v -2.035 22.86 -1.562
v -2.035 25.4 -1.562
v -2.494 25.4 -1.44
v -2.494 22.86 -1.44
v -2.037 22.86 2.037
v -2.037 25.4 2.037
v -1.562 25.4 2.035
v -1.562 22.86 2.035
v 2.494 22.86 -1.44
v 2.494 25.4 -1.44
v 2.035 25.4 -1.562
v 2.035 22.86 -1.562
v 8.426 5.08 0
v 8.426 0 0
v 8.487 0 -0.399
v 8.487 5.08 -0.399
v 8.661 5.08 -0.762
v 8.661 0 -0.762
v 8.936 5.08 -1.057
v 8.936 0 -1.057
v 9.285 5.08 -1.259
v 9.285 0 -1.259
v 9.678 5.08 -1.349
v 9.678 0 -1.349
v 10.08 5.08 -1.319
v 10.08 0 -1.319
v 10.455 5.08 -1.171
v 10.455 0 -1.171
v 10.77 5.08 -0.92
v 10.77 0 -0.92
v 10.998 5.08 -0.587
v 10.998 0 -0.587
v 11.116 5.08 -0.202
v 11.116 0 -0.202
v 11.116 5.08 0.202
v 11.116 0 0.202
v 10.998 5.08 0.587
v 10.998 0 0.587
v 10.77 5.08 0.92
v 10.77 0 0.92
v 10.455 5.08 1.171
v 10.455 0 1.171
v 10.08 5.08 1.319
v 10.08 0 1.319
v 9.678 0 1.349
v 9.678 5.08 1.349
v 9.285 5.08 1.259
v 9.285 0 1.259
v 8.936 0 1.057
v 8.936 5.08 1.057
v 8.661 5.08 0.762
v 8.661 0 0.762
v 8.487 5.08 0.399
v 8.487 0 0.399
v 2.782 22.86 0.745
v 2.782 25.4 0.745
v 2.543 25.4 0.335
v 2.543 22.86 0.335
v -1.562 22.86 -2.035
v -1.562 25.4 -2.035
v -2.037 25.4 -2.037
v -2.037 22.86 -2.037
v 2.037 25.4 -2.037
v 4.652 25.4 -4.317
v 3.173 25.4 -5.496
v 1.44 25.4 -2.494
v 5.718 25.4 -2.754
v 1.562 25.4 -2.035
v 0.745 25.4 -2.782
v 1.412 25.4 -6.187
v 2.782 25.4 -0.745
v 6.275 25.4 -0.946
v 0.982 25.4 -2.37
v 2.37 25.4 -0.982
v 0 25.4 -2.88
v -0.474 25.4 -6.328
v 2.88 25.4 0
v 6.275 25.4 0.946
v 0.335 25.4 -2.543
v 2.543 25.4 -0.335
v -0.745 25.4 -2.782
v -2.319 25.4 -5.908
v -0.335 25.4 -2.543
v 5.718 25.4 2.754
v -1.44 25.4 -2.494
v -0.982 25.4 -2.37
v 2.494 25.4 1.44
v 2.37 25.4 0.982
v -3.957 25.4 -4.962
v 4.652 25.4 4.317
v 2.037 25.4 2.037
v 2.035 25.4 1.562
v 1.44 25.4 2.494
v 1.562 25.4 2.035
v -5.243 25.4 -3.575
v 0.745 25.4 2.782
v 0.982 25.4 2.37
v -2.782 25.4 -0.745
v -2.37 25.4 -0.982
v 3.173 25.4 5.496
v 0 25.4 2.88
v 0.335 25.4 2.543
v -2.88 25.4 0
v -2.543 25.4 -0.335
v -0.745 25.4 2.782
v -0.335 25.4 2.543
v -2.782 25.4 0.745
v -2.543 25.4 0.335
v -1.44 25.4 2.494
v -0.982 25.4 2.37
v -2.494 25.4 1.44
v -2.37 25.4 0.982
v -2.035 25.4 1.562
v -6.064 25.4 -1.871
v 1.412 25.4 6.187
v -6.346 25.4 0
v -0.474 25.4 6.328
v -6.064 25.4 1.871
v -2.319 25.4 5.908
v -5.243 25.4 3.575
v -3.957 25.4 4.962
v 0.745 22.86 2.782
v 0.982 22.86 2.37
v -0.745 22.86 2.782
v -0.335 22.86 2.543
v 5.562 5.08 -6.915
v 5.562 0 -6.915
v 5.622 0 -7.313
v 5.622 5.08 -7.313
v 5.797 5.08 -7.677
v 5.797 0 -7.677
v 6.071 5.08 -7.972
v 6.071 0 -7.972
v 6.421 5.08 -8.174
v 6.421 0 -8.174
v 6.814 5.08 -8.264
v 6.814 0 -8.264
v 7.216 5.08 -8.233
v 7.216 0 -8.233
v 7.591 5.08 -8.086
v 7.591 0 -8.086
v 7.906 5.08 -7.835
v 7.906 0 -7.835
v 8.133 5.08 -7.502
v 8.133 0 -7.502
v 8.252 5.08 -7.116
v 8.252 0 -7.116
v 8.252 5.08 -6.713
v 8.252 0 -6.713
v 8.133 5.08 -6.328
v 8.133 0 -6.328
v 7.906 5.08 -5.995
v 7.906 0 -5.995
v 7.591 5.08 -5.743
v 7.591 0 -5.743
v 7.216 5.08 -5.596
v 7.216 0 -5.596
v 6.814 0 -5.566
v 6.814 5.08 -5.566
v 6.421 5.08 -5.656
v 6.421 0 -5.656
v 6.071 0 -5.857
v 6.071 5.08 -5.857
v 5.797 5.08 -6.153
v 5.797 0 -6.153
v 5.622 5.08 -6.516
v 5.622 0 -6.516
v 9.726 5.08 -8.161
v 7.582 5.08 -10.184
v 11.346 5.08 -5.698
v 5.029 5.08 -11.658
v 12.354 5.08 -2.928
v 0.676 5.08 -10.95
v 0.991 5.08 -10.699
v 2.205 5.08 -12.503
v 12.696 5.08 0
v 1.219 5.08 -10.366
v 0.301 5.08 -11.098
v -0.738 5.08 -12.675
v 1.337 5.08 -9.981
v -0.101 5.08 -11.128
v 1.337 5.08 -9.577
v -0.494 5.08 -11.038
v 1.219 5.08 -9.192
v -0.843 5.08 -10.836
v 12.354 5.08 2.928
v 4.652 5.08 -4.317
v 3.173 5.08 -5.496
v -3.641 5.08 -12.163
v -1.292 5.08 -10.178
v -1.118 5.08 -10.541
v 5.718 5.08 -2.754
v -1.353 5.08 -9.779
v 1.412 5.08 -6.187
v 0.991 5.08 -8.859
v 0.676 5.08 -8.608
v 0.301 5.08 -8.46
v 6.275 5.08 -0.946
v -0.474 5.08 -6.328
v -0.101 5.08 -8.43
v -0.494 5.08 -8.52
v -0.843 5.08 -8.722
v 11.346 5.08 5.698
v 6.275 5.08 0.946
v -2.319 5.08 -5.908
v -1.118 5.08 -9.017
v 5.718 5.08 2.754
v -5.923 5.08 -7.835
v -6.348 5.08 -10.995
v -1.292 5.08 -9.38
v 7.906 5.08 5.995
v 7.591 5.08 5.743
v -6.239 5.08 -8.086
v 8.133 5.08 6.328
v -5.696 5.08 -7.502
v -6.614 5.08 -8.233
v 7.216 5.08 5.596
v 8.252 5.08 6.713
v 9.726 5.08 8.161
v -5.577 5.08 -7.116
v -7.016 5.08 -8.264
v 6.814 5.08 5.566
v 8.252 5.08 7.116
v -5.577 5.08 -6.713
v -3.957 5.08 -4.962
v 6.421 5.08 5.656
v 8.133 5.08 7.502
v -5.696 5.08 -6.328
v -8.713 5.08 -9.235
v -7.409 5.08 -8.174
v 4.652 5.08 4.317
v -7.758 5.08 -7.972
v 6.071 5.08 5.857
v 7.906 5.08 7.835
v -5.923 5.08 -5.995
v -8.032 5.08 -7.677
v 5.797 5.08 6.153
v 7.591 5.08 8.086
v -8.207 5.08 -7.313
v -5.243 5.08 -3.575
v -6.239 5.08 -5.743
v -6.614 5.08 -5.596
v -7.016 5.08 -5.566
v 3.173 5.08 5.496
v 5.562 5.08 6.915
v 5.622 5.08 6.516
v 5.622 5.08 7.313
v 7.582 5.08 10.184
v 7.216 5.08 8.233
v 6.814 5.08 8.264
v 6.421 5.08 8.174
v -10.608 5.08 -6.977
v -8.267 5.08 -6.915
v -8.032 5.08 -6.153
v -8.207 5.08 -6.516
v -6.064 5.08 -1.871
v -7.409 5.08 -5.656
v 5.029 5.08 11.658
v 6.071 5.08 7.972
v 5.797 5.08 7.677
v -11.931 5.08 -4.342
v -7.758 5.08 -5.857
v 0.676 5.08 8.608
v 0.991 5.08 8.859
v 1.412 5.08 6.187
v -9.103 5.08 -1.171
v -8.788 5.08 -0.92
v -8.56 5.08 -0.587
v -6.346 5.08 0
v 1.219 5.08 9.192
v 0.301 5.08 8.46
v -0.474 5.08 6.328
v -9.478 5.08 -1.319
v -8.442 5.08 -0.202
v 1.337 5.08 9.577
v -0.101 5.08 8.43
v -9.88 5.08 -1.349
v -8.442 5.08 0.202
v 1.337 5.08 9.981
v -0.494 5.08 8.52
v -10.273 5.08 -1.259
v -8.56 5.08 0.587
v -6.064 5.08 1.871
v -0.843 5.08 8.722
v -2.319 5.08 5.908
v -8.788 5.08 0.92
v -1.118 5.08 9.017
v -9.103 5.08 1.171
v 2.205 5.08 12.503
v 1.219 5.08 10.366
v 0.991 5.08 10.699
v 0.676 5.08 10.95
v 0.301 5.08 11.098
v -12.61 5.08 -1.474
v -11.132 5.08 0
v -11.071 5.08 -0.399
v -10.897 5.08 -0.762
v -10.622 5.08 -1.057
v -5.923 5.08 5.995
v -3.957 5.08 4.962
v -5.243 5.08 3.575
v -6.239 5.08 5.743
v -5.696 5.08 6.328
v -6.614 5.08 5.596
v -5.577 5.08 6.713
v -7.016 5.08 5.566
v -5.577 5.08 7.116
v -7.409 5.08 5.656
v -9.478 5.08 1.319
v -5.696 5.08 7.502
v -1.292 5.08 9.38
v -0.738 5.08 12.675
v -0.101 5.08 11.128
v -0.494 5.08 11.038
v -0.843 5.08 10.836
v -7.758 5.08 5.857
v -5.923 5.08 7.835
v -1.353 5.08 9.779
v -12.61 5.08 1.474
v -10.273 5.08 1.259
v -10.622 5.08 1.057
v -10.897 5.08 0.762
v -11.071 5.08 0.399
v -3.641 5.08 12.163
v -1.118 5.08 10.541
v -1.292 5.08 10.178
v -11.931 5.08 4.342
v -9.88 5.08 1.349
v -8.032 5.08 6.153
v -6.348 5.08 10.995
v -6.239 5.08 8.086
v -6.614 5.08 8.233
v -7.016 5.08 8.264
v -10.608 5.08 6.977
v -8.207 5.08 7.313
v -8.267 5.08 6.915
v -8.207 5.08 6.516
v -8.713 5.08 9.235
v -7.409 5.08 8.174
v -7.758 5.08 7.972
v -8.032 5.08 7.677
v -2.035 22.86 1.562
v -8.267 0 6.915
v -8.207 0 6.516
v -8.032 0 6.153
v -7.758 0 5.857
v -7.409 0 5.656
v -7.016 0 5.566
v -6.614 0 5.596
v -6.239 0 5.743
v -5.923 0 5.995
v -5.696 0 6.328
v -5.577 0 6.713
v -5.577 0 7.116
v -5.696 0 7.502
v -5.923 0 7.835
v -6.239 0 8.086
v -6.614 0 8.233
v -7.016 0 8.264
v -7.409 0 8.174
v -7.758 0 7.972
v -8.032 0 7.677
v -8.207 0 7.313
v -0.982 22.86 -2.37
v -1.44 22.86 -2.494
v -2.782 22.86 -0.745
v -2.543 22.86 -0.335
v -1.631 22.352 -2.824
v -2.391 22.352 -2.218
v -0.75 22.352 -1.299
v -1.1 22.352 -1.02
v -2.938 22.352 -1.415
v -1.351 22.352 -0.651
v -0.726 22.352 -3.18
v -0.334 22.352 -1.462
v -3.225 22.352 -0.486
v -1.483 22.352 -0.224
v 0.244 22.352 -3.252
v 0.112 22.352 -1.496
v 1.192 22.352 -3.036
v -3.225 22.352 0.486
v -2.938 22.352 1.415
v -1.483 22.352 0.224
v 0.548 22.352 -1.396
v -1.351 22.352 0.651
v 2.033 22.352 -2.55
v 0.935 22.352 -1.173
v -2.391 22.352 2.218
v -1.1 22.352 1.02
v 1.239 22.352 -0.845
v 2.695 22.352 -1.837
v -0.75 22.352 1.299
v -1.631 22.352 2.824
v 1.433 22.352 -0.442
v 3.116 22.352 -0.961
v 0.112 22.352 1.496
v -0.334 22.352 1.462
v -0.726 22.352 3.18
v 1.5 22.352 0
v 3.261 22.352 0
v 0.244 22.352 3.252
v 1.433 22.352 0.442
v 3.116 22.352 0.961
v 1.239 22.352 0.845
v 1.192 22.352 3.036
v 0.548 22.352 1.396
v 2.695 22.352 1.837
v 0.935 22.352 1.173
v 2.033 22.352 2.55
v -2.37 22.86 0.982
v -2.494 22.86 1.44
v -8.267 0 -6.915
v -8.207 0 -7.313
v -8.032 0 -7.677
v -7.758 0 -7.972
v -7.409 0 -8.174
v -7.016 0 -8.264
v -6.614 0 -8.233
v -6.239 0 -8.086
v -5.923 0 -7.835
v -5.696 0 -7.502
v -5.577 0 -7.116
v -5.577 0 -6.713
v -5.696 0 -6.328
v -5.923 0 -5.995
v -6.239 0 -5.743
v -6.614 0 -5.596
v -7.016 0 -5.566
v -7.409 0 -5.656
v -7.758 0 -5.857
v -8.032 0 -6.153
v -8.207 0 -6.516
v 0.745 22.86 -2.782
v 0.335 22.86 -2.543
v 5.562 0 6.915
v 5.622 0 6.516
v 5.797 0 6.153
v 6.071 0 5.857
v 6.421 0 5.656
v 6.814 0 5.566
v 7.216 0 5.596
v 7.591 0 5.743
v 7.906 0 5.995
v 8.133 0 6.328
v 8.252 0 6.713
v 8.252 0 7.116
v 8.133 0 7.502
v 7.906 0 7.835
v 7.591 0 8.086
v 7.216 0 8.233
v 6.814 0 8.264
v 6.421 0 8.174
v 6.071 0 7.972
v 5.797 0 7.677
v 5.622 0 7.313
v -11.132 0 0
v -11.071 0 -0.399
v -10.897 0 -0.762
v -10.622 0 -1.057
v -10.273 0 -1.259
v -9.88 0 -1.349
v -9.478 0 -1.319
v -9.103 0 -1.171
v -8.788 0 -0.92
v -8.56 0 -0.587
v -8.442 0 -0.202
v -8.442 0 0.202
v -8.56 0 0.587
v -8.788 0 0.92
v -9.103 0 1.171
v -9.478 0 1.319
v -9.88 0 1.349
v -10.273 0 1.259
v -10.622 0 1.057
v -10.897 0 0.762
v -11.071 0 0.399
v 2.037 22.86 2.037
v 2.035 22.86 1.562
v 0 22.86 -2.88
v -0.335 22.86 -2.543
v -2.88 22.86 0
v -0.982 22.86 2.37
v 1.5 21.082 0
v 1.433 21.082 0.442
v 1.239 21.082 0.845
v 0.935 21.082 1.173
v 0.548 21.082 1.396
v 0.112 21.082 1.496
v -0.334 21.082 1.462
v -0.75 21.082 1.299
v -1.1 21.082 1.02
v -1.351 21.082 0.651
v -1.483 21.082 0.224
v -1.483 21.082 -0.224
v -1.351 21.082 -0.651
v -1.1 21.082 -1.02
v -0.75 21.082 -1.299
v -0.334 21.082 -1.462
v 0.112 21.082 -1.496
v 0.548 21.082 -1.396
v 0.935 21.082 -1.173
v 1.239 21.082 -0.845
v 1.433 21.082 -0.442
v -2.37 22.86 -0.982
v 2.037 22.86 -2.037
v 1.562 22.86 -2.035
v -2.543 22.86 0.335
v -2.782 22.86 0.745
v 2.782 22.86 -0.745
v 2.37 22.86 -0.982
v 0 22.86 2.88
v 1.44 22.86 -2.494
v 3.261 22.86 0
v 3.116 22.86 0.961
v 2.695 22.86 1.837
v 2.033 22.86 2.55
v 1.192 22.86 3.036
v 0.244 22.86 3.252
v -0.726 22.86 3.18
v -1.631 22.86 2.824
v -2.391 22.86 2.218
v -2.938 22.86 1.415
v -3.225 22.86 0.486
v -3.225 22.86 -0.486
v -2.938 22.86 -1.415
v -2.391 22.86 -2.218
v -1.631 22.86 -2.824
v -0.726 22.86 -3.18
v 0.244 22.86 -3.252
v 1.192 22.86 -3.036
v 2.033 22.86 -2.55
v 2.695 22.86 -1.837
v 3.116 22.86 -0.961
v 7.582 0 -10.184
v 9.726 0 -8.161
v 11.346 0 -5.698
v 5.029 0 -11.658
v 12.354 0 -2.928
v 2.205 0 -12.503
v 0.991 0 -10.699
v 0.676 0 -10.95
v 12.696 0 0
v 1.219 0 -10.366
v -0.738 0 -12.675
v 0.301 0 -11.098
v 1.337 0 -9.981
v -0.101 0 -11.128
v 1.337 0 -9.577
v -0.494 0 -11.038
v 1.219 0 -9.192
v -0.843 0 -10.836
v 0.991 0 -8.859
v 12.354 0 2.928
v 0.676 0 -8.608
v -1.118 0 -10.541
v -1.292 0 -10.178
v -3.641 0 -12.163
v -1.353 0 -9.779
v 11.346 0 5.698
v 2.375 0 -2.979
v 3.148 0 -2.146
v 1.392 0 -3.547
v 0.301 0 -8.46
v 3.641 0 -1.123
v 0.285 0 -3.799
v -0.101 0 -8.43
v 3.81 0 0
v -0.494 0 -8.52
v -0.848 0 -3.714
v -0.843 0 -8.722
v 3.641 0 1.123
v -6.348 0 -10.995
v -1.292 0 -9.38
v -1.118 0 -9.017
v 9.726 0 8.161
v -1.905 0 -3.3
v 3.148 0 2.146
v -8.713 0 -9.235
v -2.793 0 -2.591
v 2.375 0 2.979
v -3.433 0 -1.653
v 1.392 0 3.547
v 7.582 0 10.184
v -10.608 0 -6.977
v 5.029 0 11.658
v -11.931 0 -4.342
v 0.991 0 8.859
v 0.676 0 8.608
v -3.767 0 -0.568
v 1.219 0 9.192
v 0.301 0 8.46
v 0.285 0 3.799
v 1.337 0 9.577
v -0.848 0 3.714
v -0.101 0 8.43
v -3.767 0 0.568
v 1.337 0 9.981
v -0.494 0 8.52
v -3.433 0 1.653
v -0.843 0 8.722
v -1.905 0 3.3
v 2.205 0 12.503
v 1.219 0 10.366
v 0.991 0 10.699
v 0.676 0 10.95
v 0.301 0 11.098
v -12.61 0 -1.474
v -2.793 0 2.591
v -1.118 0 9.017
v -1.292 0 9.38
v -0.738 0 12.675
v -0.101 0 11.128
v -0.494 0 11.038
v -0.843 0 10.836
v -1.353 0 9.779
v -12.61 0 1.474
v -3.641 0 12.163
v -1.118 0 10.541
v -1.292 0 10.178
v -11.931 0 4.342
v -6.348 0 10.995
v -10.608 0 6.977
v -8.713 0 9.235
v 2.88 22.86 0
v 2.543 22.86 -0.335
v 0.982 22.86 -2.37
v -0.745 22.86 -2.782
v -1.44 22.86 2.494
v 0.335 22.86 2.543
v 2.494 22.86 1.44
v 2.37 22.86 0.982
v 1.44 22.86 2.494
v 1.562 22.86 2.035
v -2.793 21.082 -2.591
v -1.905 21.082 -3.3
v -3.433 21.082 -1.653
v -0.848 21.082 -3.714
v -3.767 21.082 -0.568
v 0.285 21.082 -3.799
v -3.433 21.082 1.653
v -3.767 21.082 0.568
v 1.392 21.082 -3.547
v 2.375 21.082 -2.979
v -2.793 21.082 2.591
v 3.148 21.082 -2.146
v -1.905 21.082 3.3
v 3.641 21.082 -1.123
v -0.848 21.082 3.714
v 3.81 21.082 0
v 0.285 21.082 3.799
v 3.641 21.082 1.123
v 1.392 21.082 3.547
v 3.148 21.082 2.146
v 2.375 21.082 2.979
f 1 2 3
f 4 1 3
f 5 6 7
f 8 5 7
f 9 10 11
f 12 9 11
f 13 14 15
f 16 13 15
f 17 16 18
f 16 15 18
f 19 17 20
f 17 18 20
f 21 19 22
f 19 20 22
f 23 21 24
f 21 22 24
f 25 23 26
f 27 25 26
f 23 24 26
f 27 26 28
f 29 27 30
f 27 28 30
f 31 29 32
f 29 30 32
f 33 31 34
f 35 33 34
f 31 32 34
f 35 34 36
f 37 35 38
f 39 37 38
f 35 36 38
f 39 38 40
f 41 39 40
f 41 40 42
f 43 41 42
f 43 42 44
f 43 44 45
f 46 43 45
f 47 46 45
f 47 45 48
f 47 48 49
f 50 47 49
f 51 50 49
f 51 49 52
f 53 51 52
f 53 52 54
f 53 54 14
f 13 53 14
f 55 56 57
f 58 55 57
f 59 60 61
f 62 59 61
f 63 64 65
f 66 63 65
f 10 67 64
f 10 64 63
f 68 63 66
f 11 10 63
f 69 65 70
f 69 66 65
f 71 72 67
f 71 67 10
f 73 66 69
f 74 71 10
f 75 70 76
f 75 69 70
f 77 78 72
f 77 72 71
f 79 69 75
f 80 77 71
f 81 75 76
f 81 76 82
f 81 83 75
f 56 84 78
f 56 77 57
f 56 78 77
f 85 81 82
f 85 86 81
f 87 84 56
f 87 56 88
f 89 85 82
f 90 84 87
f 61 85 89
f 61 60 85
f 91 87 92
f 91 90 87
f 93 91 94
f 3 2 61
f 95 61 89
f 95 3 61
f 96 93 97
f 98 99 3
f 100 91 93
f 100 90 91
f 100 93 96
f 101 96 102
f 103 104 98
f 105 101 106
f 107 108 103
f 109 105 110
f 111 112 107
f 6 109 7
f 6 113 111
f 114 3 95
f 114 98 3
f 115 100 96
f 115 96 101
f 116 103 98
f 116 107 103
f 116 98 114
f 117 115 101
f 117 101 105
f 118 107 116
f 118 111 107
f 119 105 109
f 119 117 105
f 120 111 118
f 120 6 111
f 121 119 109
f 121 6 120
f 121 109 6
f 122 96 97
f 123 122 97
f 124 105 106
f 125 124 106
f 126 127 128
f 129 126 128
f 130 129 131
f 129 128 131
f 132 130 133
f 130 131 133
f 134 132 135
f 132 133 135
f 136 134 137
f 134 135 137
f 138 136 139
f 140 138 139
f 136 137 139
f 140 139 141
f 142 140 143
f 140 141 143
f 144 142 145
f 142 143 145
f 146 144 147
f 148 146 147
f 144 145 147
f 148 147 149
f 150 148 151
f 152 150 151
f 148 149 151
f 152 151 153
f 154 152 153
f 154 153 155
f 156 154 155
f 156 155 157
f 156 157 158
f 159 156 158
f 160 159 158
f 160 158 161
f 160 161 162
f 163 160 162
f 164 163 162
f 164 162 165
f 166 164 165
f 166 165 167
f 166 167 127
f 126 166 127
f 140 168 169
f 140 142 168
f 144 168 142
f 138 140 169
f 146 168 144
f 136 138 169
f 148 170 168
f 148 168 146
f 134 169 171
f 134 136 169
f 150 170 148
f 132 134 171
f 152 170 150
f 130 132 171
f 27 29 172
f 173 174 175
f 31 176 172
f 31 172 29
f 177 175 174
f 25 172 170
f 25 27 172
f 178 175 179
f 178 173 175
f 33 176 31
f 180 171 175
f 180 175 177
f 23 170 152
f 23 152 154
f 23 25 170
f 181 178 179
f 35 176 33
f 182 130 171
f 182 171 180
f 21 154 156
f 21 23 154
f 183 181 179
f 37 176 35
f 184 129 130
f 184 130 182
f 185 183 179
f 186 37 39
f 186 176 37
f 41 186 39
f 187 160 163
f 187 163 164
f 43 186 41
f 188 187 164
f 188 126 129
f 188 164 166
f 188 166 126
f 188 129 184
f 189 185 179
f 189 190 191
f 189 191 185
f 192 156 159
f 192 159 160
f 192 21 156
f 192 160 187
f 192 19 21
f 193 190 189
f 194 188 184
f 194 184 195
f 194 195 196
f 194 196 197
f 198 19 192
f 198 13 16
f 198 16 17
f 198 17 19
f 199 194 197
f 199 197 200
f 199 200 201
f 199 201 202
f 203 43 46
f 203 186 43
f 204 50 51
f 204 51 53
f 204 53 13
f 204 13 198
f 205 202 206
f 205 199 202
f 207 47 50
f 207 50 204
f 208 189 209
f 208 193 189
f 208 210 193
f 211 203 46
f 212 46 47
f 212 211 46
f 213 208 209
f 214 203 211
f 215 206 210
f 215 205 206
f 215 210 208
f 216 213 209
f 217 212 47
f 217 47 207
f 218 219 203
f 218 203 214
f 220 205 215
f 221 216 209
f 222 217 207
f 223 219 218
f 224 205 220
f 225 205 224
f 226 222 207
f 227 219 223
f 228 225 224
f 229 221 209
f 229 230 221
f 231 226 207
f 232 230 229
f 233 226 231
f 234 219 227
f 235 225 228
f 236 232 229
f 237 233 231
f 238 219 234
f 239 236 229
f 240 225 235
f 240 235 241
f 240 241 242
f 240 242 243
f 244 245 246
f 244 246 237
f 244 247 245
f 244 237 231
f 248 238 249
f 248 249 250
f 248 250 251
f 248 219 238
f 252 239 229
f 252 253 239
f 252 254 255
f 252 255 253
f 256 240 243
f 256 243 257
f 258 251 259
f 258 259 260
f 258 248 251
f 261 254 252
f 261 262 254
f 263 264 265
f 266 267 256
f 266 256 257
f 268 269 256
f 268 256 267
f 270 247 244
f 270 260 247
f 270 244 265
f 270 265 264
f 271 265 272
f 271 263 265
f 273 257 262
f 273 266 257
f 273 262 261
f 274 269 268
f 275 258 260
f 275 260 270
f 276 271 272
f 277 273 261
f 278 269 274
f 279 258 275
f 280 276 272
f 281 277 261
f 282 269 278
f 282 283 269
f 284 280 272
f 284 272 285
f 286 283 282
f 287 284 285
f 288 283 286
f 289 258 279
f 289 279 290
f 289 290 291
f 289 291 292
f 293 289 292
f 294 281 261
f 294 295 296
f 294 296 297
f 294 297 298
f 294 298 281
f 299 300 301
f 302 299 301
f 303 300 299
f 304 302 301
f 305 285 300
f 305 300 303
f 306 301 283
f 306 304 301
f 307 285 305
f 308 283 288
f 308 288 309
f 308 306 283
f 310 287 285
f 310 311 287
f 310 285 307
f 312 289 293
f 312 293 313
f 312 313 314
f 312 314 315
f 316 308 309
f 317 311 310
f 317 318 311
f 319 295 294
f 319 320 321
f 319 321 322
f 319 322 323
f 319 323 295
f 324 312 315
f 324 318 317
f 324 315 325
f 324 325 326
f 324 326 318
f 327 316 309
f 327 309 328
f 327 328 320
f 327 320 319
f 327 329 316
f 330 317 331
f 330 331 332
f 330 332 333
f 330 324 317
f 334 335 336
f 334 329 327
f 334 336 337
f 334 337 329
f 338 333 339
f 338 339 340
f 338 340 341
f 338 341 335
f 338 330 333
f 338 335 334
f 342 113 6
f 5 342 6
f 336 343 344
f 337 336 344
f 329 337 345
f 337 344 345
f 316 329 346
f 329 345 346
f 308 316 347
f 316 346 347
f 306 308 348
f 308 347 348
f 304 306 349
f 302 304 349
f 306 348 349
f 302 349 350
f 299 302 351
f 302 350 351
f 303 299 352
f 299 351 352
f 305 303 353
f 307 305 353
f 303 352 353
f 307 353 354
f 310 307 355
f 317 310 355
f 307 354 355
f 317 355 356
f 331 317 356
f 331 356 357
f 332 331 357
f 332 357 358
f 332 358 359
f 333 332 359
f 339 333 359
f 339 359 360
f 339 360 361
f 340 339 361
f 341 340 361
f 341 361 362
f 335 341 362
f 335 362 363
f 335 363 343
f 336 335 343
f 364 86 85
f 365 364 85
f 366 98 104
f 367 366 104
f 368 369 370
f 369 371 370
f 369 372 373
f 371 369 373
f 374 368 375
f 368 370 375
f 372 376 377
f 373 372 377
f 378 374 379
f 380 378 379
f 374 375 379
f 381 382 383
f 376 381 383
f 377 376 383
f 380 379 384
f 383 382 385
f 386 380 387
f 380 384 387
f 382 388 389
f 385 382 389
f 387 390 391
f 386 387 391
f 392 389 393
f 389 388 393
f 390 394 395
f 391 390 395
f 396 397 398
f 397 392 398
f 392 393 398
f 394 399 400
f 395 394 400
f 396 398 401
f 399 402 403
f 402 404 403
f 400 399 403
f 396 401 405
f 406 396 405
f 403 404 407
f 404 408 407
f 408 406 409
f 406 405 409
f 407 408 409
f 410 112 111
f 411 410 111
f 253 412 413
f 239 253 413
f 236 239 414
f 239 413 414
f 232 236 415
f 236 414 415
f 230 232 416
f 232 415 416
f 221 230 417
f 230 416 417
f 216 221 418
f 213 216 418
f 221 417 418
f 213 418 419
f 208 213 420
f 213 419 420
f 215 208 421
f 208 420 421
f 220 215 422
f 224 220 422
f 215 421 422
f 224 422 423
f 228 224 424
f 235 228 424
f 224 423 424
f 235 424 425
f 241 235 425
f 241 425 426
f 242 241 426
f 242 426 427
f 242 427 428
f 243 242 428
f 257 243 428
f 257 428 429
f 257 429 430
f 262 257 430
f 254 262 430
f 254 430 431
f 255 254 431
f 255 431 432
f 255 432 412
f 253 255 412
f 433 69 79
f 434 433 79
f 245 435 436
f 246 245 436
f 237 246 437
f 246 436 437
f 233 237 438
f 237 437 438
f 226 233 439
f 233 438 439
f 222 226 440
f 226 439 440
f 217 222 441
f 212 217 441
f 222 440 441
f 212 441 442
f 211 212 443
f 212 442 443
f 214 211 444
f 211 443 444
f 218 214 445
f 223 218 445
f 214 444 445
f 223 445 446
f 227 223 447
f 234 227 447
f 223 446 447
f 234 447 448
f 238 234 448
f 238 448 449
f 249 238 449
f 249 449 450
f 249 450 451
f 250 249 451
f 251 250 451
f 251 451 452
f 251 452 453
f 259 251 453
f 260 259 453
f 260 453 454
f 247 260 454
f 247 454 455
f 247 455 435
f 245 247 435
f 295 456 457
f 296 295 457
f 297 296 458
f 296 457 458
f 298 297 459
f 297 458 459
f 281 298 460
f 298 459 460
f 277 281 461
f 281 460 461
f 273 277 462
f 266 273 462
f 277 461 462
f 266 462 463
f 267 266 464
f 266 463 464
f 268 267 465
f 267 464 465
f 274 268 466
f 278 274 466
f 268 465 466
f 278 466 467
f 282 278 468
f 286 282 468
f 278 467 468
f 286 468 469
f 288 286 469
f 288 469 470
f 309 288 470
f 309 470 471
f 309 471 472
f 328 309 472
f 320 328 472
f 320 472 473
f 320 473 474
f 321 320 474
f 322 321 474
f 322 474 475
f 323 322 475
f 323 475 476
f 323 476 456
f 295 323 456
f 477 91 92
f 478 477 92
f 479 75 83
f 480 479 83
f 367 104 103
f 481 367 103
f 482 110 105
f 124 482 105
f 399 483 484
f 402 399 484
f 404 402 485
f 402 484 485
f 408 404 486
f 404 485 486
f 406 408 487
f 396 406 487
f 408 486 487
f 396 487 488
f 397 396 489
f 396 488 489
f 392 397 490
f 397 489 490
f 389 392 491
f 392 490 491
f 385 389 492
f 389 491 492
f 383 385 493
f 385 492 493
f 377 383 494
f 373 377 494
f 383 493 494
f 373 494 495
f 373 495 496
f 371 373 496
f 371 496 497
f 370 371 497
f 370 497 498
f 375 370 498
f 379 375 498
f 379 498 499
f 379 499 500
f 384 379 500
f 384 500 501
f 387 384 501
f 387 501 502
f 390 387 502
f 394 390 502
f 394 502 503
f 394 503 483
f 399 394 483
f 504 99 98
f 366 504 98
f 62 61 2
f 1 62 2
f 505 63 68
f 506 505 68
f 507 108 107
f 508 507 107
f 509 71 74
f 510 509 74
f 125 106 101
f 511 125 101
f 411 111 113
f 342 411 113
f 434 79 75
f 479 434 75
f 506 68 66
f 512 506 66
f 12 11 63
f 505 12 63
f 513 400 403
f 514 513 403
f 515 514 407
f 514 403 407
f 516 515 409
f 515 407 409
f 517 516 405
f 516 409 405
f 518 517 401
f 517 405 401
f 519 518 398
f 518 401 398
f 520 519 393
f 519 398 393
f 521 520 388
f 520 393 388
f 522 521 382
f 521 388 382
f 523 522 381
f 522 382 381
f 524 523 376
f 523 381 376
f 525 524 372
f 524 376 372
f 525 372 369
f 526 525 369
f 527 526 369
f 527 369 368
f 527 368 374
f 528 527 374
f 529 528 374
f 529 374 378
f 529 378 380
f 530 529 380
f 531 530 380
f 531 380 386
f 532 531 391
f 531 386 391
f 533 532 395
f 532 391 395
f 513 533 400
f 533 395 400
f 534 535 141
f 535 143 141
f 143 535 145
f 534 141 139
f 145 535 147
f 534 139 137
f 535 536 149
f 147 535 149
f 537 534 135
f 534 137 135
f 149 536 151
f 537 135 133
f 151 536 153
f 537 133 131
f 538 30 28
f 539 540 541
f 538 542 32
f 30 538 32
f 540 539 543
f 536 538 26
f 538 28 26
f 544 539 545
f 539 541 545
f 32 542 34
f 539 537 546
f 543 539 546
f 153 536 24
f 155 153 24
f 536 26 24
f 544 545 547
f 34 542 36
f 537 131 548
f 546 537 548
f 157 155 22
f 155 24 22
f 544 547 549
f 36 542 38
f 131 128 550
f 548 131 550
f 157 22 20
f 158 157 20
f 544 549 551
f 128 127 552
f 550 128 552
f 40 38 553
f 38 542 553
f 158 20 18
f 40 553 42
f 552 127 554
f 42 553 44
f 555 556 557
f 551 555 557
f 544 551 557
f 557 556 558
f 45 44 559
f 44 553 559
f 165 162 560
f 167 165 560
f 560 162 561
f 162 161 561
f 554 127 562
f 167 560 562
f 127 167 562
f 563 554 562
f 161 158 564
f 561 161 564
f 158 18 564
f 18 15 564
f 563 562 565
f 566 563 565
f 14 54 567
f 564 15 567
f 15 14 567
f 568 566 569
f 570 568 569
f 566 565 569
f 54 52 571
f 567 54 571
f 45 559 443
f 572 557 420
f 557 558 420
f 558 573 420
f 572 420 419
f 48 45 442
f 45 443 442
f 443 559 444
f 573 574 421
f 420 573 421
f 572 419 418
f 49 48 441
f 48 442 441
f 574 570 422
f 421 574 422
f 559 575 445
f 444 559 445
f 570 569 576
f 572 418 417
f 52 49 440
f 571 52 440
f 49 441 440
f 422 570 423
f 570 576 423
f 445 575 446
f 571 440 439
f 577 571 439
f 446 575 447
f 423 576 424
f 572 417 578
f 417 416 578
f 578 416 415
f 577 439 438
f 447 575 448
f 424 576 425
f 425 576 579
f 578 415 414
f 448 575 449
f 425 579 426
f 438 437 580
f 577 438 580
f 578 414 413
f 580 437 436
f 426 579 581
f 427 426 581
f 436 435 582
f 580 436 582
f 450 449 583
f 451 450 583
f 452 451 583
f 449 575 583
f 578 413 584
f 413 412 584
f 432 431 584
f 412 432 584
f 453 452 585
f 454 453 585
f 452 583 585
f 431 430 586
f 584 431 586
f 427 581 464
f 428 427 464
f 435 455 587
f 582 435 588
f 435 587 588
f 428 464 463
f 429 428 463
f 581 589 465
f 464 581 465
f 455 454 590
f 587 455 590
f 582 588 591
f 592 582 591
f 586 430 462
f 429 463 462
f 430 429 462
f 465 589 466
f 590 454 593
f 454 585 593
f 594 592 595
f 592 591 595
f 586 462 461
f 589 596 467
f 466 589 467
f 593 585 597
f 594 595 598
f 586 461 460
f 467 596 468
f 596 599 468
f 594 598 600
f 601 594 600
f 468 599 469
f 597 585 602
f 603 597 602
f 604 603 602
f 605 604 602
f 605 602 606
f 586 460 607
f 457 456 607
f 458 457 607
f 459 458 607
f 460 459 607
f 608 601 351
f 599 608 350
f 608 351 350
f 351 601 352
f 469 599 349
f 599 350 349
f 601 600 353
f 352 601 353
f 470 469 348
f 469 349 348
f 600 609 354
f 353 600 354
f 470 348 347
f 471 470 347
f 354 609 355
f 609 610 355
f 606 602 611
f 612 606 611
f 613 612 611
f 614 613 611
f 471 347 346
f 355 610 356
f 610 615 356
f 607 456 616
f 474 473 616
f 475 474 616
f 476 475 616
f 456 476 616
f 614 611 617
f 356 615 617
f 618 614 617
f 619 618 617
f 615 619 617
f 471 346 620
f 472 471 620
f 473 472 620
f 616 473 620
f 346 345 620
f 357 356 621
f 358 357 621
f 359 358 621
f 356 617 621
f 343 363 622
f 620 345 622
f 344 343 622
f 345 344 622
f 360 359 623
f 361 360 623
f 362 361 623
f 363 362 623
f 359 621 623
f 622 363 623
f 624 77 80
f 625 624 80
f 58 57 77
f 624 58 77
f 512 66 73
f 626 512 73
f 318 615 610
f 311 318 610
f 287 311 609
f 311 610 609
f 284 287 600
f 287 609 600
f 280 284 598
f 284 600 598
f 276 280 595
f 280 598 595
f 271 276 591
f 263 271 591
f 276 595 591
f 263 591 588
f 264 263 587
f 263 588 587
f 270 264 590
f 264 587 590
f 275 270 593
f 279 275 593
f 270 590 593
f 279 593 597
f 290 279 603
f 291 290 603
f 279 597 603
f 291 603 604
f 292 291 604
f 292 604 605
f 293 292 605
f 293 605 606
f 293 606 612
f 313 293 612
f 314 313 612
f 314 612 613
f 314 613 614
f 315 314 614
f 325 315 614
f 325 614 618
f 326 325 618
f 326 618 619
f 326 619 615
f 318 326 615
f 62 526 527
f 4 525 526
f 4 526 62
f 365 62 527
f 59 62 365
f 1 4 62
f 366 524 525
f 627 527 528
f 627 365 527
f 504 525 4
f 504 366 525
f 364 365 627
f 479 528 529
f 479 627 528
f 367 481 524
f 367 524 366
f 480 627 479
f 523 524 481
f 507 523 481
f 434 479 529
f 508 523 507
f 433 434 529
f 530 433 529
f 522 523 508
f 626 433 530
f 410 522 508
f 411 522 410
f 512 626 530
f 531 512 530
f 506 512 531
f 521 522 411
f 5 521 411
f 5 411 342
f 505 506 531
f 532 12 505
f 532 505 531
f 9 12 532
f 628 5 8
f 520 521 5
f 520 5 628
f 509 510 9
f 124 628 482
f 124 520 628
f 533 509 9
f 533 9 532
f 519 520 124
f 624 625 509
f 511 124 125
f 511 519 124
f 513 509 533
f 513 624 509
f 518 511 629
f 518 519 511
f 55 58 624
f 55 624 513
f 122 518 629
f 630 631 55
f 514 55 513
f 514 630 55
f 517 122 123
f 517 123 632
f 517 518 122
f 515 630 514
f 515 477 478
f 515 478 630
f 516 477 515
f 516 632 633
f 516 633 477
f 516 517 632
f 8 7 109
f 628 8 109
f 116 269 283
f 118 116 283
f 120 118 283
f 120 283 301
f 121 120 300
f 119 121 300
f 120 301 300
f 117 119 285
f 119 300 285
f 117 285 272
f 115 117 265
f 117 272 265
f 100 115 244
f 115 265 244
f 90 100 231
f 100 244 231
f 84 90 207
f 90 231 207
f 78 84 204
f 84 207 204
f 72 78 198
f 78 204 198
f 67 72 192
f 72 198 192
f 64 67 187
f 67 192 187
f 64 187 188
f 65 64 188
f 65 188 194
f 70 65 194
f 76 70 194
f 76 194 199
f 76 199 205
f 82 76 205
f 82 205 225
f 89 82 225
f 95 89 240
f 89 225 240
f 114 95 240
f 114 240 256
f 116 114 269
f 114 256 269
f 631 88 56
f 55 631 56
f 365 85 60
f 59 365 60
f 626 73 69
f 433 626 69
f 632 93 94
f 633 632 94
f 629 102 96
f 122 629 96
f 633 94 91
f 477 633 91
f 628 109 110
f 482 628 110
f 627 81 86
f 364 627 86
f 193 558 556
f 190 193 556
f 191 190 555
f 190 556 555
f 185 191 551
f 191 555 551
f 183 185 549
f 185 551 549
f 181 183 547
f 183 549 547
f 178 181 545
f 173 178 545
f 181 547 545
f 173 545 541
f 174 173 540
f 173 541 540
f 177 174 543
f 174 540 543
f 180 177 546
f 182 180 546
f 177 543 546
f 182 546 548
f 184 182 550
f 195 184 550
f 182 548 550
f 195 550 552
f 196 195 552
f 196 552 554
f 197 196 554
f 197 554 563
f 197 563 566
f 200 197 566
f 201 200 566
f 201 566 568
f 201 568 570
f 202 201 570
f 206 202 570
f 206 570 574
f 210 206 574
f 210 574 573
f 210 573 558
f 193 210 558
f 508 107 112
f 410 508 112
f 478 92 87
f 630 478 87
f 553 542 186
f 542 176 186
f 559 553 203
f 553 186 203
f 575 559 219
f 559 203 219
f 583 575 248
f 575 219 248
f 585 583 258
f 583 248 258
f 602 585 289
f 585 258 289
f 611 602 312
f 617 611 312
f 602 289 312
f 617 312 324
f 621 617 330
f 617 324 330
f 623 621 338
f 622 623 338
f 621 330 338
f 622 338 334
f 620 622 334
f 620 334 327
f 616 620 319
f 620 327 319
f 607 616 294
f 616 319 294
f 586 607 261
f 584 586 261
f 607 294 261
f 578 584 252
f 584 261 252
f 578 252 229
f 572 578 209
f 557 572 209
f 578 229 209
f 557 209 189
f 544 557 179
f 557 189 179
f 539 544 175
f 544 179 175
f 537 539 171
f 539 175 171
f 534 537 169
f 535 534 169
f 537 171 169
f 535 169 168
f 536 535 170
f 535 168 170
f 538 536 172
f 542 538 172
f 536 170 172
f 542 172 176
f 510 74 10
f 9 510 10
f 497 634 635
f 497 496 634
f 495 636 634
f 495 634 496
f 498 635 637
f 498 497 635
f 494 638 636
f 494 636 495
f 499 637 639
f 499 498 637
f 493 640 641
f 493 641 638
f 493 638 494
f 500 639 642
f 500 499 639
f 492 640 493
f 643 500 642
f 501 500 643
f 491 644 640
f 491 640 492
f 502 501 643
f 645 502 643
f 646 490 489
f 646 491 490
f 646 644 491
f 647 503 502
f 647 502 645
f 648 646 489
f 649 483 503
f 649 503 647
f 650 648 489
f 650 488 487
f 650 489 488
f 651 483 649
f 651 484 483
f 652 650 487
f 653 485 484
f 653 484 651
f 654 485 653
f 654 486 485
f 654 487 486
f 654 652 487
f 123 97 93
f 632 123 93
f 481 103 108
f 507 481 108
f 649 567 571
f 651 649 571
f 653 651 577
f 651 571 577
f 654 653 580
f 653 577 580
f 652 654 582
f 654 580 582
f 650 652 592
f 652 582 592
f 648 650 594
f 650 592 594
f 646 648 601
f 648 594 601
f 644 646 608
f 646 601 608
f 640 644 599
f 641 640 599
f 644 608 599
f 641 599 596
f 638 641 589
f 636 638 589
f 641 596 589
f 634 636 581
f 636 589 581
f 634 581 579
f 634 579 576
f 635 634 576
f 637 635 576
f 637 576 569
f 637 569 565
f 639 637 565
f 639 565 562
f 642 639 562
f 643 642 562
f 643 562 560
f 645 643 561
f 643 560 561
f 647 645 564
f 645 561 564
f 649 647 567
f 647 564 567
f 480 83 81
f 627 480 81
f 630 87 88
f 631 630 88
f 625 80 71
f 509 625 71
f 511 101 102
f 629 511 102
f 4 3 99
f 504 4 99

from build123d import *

# Parameters (mm, degrees)
SKETCH1_W                  = 12.69619
SKETCH1_H                  = 5.08
SKETCH2_R                  = 6.34619
BOSS_EXTRUDE1_DEPTH        = 20.32
SKETCH3_R                  = 3.26136
CUT_EXTRUDE1_DEPTH         = 0.508
CUT_EXTRUDE2_REACH         = 27.4
SKETCH5_R                  = 3.81
CUT_EXTRUDE3_DEPTH         = 21.082
SKETCH6_R                  = 1.5
CUT_EXTRUDE4_DEPTH         = 5.318
M2_5_CLEARANCE_HOLE1_D     = 2.7051
M2_5_CLEARANCE_HOLE1_DEPTH = 5.08


with BuildPart() as part:
    # Sketch1 → Revolve1 (revolve)
    with BuildSketch(Plane.XY):
        with Locations((6.348095, 2.54)):
            Rectangle(SKETCH1_W, SKETCH1_H)
    revolve(axis=Axis((0, 5.08, 0), (0, -1, 0)))

    # Sketch2 → Boss-Extrude1 (add)
    with BuildSketch(Plane(origin=(0, 5.08, 0), x_dir=(-1, 0, 0), z_dir=(0, 1, 0))):
        Circle(SKETCH2_R)
    extrude(amount=BOSS_EXTRUDE1_DEPTH)

    # Sketch3 → Cut-Extrude1 (cut)
    with BuildSketch(Plane.XZ.offset(-22.352)):
        Circle(SKETCH3_R)
    extrude(amount=-CUT_EXTRUDE1_DEPTH, mode=Mode.SUBTRACT)

    # Sketch4 → Cut-Extrude2 (cut, up to next)
    with BuildSketch(Plane(origin=(0, 25.4, 0), x_dir=(-1, 0, 0), z_dir=(0, 1, 0)), mode=Mode.PRIVATE) as cut_extrude2_sk1:
        Polygon((-2.494464932, -1.44018), (-2.035268659, -1.56171657), (-2.036722088, -2.036722088), (-1.56171657, -2.035268659), (-1.44018, -2.494464932), (-0.981736077, -2.370120553), (-0.745492025, -2.782214113), (-0.334851894, -2.543452647), (0, -2.88036), (0.334851894, -2.543452647), (0.745492025, -2.782214113), (0.981736077, -2.370120553), (1.44018, -2.494464932), (1.56171657, -2.035268659), (2.036722088, -2.036722088), (2.035268659, -1.56171657), (2.494464932, -1.44018), (2.370120553, -0.981736077), (2.782214113, -0.745492025), (2.543452647, -0.334851894), (2.88036, 0), (2.543452647, 0.334851894), (2.782214113, 0.745492025), (2.370120553, 0.981736077), (2.494464932, 1.44018), (2.035268659, 1.56171657), (2.036722088, 2.036722088), (1.56171657, 2.035268659), (1.44018, 2.494464932), (0.981736077, 2.370120553), (0.745492025, 2.782214113), (0.334851894, 2.543452647), (0, 2.88036), (-0.334851894, 2.543452647), (-0.745492025, 2.782214113), (-0.981736077, 2.370120553), (-1.44018, 2.494464932), (-1.56171657, 2.035268659), (-2.036722088, 2.036722088), (-2.035268659, 1.56171657), (-2.494464932, 1.44018), (-2.370120553, 0.981736077), (-2.782214113, 0.745492025), (-2.543452647, 0.334851894), (-2.88036, 0), (-2.543452647, -0.334851894), (-2.782214113, -0.745492025), (-2.370120553, -0.981736077), align=None)
    cut_extrude2_tool1 = extrude(cut_extrude2_sk1.sketch, amount=-CUT_EXTRUDE2_REACH, mode=Mode.PRIVATE) & part.part
    add(cut_extrude2_tool1.solids().sort_by_distance((0, 25.4, 0))[0], mode=Mode.SUBTRACT)

    # Sketch5 → Cut-Extrude3 (cut)
    with BuildSketch(Plane.XZ):
        Circle(SKETCH5_R)
    extrude(amount=-CUT_EXTRUDE3_DEPTH, mode=Mode.SUBTRACT)

    # Sketch6 → Cut-Extrude4 (cut, through all)
    with BuildSketch(Plane.XZ.offset(-21.082)):
        Circle(SKETCH6_R)
    extrude(amount=-CUT_EXTRUDE4_DEPTH, mode=Mode.SUBTRACT)

    # M2.5 Clearance Hole1
    with Locations(Plane(origin=(0, 5.08, 0), x_dir=(1, 0, 0), z_dir=(0, 1, 0))):
        with Locations((6.914797213, -6.914797213), (0, -9.779), (-6.914797213, -6.914797213), (-9.779, 0), (-6.914797213, 6.914797213), (0, 9.779), (6.914797213, 6.914797213), (9.779, 0)):
            Hole(M2_5_CLEARANCE_HOLE1_D / 2, depth=M2_5_CLEARANCE_HOLE1_DEPTH)


solid = part.part
